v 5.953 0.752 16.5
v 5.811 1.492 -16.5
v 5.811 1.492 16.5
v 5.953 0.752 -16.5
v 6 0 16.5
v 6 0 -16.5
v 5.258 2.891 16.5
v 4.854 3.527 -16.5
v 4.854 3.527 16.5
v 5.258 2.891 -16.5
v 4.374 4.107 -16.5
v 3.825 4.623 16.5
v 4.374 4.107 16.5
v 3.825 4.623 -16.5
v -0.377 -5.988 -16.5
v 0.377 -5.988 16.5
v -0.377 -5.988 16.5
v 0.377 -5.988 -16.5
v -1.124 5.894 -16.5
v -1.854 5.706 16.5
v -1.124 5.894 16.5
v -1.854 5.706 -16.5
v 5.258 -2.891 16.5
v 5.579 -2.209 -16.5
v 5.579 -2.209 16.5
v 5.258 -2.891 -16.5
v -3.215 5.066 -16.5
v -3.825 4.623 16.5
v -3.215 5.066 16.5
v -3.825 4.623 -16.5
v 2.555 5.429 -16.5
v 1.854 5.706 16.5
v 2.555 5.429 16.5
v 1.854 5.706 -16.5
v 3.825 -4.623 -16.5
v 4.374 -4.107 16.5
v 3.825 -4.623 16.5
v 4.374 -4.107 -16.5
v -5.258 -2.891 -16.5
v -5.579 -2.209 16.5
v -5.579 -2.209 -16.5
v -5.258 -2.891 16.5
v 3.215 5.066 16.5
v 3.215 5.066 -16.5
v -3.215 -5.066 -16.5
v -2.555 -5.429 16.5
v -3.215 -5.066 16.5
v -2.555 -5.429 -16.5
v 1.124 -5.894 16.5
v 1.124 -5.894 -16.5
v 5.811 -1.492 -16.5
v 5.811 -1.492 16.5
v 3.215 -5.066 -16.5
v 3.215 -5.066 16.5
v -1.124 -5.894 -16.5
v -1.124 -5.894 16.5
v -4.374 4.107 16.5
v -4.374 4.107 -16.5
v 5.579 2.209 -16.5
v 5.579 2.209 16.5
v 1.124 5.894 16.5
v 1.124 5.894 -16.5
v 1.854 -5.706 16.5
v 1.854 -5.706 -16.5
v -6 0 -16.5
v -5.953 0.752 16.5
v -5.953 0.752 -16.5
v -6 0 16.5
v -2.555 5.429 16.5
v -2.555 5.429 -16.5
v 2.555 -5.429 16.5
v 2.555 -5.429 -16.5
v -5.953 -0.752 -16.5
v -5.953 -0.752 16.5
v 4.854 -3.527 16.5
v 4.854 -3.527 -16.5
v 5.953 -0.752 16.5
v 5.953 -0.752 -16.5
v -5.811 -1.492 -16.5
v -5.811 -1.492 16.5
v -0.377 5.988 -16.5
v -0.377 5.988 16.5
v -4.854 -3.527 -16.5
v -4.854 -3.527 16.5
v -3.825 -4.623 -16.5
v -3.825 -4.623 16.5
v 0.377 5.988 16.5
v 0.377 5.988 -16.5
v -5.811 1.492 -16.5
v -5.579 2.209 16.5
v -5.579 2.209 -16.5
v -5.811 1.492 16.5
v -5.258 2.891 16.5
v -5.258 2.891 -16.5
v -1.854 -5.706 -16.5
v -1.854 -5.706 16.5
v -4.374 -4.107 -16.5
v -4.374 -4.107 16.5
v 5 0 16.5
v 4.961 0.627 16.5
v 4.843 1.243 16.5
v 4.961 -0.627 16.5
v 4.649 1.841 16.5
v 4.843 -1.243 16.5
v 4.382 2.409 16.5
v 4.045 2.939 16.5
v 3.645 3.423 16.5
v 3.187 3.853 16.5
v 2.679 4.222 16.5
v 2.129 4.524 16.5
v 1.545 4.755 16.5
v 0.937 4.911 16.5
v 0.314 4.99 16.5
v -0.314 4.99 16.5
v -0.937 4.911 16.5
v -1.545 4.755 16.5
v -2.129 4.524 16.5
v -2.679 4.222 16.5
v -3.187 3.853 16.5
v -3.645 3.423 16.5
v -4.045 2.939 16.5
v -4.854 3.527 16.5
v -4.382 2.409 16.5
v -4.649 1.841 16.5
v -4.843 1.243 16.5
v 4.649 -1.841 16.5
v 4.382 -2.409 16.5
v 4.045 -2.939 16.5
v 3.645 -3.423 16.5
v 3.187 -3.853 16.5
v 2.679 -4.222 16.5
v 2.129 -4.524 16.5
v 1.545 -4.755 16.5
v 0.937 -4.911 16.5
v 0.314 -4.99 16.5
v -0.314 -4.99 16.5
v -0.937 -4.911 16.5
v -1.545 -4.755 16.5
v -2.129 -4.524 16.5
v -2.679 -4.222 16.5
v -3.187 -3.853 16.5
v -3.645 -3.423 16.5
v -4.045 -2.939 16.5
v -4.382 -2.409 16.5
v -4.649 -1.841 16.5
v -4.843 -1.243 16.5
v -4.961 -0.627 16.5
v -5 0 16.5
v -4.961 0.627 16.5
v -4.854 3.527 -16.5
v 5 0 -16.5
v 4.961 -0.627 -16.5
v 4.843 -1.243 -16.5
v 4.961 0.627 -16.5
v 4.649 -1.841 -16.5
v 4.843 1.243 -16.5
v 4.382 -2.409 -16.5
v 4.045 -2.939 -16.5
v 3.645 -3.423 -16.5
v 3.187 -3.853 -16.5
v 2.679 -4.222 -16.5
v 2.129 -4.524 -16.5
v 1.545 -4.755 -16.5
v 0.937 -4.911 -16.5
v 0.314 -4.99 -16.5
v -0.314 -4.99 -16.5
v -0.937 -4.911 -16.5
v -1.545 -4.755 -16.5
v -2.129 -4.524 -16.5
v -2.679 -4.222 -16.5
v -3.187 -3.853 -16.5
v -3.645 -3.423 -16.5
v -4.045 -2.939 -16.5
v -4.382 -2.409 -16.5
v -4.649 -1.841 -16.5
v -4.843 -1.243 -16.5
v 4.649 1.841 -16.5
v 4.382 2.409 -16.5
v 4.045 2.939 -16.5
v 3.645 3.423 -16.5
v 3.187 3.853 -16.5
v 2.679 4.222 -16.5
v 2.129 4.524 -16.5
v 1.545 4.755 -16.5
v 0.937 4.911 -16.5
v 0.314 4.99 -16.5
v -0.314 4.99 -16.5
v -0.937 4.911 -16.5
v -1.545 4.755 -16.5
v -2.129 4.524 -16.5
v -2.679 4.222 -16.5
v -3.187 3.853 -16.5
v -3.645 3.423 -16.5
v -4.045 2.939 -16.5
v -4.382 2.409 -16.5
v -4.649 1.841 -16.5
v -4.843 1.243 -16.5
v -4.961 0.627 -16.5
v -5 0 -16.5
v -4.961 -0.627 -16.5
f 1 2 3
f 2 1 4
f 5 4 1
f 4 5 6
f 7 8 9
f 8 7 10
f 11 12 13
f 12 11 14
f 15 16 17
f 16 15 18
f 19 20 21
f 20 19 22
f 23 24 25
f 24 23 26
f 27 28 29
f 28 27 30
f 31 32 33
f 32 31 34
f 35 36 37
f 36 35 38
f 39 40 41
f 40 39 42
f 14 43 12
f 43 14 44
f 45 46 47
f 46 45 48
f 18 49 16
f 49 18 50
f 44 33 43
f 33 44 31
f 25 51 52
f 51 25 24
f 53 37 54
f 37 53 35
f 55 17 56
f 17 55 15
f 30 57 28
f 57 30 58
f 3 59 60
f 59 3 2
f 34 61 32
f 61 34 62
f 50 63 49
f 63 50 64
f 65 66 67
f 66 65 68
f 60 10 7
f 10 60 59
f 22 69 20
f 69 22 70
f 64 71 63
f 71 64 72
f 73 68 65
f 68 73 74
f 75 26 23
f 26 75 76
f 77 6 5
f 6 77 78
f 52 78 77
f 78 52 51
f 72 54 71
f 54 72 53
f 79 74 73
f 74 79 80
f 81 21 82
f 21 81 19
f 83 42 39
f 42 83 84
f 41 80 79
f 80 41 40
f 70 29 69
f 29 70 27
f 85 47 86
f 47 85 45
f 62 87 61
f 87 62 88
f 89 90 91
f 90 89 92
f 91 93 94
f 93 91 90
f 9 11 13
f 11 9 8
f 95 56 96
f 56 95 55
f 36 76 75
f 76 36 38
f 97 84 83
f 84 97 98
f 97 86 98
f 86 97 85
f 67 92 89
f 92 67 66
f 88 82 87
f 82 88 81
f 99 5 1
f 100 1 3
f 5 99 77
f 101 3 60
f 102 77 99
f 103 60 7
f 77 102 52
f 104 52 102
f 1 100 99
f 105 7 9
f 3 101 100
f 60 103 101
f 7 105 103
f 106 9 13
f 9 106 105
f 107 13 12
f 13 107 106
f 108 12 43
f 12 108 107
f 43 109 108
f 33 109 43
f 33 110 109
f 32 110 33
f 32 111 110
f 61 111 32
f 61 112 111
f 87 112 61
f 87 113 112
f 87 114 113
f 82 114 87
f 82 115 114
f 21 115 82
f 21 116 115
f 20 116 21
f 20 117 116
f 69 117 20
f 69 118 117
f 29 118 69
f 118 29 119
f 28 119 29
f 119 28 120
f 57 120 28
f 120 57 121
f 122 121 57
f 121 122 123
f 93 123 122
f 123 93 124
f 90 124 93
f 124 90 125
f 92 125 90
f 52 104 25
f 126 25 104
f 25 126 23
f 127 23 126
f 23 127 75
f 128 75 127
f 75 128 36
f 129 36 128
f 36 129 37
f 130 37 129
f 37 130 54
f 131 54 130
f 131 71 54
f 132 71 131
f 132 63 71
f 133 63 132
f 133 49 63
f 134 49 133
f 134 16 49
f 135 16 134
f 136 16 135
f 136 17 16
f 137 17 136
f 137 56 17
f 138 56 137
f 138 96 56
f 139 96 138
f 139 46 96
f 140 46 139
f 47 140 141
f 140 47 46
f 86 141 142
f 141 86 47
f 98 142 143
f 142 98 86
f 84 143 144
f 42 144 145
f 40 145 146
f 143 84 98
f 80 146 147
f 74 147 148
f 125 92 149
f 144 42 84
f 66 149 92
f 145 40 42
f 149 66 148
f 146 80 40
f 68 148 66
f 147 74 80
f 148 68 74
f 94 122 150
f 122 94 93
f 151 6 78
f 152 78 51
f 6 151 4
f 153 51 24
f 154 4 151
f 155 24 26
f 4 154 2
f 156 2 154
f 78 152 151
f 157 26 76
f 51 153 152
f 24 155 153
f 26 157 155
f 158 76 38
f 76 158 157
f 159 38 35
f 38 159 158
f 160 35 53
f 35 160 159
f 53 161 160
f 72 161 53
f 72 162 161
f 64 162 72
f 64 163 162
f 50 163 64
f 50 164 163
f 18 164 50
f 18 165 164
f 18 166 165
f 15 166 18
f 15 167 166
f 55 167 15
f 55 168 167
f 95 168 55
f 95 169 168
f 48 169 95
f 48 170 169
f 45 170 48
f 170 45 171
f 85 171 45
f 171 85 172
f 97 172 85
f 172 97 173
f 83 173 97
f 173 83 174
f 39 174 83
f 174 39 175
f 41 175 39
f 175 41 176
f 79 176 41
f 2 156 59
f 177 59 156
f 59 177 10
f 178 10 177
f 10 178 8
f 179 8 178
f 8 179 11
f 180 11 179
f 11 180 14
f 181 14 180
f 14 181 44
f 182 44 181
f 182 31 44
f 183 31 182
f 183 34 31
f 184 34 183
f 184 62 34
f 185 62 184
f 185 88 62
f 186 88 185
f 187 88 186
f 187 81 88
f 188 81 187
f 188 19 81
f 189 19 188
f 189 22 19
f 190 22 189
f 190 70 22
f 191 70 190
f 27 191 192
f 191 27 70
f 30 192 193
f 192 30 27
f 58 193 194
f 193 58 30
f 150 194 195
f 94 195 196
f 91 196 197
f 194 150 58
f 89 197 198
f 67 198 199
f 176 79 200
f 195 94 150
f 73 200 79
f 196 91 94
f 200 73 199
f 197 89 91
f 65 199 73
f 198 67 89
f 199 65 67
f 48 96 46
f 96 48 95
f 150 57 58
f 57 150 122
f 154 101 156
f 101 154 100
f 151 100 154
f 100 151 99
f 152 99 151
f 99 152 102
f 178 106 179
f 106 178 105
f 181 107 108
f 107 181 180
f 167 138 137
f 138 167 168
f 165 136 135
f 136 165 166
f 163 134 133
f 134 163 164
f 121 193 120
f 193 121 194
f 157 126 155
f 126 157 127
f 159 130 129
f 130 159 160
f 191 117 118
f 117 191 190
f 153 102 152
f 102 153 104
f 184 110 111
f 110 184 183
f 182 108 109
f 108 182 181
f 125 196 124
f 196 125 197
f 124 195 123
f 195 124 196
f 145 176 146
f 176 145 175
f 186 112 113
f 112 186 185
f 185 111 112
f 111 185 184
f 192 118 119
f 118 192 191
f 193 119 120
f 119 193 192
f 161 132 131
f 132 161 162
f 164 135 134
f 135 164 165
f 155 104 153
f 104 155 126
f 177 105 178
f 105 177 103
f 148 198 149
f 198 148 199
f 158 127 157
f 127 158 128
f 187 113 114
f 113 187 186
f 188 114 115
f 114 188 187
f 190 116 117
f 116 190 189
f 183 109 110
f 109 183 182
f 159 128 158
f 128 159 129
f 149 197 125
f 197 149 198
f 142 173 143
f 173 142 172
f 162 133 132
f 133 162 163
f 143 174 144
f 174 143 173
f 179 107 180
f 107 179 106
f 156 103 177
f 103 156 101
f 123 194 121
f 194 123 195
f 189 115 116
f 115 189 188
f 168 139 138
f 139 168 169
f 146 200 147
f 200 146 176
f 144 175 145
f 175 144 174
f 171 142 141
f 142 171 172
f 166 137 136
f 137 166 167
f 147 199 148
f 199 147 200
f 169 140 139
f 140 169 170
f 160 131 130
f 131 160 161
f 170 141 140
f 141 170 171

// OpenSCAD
$fn = 50;


difference() {
	union() {
		translate(v = [0, 0, -16.5000000000]) {
			cylinder(h = 33, r = 6.0000000000);
		}
	}
	union() {
		translate(v = [0, 0, -100.0000000000]) {
			cylinder(h = 200, r = 5.0000000000);
		}
	}
}
